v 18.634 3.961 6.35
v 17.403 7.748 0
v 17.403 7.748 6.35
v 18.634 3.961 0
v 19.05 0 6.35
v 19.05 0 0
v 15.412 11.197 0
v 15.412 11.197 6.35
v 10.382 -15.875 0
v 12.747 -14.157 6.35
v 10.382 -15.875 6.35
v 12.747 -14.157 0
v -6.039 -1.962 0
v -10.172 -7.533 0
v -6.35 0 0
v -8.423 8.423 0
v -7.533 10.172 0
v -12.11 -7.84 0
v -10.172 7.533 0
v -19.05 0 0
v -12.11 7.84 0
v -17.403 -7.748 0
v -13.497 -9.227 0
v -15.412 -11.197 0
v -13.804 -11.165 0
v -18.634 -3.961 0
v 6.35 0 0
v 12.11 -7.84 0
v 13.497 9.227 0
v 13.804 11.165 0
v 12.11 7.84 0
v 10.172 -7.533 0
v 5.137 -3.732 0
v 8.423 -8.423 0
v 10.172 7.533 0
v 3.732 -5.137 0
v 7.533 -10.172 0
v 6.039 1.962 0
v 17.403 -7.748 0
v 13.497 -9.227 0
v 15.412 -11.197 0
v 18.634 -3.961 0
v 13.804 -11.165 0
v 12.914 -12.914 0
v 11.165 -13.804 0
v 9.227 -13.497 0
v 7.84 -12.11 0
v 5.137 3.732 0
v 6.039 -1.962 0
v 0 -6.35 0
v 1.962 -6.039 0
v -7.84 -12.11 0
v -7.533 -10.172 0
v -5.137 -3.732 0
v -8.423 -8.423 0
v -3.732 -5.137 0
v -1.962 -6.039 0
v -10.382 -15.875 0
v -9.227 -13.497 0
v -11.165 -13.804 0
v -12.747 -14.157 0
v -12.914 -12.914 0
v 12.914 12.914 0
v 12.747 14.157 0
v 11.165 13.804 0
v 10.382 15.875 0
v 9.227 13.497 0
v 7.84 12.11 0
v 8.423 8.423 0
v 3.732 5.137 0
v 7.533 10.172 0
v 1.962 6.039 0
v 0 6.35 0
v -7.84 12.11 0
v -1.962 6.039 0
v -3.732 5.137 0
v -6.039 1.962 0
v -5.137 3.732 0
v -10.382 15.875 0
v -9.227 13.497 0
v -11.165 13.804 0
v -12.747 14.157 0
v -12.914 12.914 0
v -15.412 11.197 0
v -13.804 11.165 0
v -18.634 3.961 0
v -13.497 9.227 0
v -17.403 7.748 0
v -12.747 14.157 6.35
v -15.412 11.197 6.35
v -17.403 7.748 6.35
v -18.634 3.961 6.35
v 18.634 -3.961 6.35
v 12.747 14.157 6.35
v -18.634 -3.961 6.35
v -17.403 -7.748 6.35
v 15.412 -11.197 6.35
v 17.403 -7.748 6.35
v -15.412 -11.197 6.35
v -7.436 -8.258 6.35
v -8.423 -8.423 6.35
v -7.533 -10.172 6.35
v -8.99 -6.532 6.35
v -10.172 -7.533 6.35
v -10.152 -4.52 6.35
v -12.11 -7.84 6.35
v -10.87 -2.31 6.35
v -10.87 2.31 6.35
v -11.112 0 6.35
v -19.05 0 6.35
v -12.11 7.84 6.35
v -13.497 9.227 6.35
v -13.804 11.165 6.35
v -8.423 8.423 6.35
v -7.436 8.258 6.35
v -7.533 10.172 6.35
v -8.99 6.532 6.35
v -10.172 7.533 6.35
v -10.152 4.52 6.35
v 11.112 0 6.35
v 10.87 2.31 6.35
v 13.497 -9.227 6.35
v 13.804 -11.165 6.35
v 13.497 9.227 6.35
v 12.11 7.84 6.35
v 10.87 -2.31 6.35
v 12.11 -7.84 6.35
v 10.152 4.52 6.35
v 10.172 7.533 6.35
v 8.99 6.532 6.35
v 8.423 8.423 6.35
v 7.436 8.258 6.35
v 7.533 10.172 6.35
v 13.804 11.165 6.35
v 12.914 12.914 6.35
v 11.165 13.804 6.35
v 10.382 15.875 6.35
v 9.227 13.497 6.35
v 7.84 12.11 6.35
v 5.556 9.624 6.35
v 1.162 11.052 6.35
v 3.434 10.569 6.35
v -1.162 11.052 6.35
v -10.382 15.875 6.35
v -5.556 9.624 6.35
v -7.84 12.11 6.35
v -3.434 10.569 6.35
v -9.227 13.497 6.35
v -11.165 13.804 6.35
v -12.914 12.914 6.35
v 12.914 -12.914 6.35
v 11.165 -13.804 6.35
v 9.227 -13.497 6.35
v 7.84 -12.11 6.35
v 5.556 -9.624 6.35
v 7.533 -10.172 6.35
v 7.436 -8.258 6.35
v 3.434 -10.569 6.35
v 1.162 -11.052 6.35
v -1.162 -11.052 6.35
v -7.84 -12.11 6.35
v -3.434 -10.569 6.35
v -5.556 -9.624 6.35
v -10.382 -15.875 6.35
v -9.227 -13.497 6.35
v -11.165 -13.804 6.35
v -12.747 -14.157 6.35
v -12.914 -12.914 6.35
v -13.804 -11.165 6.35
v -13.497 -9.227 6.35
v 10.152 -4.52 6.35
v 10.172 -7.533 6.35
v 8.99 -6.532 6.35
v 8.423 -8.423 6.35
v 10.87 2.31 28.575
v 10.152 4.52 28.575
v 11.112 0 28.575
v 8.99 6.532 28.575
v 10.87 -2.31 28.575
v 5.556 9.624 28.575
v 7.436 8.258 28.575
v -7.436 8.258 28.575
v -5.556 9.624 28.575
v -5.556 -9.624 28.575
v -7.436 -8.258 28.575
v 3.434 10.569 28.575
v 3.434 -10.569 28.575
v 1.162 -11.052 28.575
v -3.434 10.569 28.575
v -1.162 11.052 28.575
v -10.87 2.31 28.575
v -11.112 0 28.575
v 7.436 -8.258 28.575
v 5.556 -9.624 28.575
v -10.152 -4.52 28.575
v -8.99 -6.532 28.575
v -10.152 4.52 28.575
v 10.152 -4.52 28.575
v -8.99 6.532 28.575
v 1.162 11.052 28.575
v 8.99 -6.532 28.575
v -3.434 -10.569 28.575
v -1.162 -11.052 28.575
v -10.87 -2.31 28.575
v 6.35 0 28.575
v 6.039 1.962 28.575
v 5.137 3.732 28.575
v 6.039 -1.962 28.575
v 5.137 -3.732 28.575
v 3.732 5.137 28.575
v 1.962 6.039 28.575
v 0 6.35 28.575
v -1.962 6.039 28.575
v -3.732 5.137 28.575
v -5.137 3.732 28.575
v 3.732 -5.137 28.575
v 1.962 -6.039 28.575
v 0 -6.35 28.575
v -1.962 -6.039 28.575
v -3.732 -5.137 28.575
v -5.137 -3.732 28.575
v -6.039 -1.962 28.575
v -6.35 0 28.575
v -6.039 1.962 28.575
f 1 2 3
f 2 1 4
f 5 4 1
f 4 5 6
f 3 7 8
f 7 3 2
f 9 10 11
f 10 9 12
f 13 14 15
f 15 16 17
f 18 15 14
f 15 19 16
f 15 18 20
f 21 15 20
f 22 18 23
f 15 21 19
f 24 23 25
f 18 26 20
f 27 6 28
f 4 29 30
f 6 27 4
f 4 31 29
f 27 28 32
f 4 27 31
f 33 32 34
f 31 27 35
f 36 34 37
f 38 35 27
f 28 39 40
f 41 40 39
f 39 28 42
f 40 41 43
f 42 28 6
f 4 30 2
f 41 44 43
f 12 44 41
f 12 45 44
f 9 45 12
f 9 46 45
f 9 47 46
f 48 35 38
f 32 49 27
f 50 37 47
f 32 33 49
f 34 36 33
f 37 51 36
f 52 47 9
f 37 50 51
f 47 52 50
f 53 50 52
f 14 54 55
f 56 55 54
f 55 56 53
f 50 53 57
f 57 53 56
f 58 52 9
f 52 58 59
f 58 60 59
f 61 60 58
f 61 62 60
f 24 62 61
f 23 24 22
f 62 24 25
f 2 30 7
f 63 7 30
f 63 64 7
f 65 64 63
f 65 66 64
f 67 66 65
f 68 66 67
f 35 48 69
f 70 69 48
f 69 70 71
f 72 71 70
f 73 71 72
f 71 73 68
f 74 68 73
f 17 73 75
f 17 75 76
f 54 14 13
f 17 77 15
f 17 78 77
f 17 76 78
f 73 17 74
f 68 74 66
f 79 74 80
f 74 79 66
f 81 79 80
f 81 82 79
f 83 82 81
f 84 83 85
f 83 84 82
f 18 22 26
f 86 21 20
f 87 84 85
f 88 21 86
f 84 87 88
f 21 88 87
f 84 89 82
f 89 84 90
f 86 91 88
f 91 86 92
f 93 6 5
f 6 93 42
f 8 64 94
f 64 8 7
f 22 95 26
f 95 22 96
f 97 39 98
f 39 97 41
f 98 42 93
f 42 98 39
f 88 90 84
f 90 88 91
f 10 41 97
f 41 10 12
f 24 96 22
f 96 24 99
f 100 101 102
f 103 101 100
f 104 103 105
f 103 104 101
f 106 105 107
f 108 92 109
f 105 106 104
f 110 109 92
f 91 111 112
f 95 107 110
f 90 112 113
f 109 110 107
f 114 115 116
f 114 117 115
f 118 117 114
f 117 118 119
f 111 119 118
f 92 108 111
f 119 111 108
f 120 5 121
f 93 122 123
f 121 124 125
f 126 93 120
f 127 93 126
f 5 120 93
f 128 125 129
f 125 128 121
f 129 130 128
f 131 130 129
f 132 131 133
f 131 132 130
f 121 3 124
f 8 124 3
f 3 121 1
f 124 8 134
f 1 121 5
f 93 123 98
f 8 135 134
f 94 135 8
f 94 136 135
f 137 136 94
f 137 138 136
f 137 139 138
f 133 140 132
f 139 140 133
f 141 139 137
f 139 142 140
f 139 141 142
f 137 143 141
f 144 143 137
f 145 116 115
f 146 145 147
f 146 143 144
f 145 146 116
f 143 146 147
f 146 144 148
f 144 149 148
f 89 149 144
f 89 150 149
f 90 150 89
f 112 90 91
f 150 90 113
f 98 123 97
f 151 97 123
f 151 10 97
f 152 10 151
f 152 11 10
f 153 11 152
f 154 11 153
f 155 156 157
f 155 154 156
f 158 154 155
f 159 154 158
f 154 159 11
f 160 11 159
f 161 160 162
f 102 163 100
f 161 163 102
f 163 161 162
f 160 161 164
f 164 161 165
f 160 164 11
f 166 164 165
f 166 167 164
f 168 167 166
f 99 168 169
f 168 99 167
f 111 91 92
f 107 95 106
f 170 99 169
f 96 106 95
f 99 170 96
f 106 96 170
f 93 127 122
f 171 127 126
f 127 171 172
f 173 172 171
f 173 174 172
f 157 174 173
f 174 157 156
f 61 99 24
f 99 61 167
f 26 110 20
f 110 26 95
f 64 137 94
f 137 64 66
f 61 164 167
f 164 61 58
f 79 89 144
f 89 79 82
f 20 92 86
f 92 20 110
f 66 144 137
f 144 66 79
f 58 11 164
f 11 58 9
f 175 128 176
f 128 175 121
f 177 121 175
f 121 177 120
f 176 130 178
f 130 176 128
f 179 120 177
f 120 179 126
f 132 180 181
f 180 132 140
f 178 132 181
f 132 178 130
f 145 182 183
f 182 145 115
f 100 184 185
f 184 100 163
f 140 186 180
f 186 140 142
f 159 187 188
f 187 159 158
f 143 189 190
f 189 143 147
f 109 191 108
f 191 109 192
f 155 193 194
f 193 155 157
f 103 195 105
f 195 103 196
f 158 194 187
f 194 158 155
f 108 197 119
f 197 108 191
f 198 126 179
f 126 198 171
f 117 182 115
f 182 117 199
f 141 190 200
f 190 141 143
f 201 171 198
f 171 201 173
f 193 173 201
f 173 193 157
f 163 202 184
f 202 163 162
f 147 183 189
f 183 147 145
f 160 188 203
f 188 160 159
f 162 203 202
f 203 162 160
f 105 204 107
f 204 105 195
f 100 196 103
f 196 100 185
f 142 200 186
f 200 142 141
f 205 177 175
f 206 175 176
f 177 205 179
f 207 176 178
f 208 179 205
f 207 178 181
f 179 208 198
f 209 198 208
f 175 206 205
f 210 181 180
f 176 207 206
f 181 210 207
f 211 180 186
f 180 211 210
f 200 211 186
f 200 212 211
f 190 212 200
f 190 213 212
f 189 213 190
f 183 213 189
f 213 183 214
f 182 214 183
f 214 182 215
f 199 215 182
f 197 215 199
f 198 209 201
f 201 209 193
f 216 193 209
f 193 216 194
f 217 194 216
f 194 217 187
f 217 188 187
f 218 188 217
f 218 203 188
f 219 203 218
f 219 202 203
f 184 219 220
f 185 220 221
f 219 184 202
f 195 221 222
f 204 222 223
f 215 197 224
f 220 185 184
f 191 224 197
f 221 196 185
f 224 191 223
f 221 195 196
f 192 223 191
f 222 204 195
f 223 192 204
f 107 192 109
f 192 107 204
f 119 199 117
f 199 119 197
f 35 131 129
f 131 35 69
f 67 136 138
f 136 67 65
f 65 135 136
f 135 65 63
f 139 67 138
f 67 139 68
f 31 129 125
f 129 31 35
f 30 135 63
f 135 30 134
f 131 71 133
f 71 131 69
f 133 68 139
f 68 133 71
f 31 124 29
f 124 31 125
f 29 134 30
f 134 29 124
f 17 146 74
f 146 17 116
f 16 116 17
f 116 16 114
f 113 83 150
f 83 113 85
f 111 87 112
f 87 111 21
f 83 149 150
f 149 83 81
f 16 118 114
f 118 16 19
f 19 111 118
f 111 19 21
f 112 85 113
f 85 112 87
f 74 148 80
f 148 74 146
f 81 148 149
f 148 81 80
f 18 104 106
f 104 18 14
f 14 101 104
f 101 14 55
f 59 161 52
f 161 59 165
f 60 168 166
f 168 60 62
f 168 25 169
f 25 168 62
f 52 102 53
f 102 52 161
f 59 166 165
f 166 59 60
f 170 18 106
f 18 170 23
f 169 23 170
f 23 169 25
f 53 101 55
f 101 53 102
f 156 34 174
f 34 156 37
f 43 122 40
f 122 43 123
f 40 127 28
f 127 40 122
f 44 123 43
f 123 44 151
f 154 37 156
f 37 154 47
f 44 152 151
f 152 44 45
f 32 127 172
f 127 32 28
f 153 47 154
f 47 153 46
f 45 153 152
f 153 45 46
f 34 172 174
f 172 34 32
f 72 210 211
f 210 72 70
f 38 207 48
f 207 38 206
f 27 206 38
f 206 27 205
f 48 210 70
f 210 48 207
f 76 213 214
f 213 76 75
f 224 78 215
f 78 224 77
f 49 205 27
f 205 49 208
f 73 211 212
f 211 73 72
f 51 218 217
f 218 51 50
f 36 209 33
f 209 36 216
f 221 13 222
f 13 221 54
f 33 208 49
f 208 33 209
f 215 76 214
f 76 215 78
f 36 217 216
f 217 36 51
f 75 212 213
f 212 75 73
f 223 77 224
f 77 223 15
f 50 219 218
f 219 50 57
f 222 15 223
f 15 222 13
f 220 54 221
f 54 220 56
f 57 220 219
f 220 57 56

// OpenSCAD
module anti_backlash_nut()
{
	function mm(inch) = inch * 25.4;

	bore = mm(0.5);
	ht = mm(1.125);
	sm_d = mm(0.875);
	fl_d = mm(1.5);
	fl_w = mm(1.25);
	fl_ht = mm(0.25);
	mnt_cir_r = mm(1.188 / 2);
	mnt_d = mm(0.25);

	difference()
	{
		union()
		{
			cylinder(r=sm_d / 2, h = ht);
			intersection()
			{
				cylinder(r=fl_d / 2, h = fl_ht);
				translate([0,0,fl_ht / 2])
					cube([fl_d, fl_w, fl_ht], center=true);
			}
		}
		translate([0,0,-0.1])
			cylinder(r=bore / 2, h = ht + 0.2);
		for(a = [45,135,225,315])
		{
			rotate([0,0,a])
				translate([mnt_cir_r,0,-0.1])
					cylinder(r = mnt_d / 2, h = fl_ht + 0.2);
		}
	}	
}

anti_backlash_nut();
